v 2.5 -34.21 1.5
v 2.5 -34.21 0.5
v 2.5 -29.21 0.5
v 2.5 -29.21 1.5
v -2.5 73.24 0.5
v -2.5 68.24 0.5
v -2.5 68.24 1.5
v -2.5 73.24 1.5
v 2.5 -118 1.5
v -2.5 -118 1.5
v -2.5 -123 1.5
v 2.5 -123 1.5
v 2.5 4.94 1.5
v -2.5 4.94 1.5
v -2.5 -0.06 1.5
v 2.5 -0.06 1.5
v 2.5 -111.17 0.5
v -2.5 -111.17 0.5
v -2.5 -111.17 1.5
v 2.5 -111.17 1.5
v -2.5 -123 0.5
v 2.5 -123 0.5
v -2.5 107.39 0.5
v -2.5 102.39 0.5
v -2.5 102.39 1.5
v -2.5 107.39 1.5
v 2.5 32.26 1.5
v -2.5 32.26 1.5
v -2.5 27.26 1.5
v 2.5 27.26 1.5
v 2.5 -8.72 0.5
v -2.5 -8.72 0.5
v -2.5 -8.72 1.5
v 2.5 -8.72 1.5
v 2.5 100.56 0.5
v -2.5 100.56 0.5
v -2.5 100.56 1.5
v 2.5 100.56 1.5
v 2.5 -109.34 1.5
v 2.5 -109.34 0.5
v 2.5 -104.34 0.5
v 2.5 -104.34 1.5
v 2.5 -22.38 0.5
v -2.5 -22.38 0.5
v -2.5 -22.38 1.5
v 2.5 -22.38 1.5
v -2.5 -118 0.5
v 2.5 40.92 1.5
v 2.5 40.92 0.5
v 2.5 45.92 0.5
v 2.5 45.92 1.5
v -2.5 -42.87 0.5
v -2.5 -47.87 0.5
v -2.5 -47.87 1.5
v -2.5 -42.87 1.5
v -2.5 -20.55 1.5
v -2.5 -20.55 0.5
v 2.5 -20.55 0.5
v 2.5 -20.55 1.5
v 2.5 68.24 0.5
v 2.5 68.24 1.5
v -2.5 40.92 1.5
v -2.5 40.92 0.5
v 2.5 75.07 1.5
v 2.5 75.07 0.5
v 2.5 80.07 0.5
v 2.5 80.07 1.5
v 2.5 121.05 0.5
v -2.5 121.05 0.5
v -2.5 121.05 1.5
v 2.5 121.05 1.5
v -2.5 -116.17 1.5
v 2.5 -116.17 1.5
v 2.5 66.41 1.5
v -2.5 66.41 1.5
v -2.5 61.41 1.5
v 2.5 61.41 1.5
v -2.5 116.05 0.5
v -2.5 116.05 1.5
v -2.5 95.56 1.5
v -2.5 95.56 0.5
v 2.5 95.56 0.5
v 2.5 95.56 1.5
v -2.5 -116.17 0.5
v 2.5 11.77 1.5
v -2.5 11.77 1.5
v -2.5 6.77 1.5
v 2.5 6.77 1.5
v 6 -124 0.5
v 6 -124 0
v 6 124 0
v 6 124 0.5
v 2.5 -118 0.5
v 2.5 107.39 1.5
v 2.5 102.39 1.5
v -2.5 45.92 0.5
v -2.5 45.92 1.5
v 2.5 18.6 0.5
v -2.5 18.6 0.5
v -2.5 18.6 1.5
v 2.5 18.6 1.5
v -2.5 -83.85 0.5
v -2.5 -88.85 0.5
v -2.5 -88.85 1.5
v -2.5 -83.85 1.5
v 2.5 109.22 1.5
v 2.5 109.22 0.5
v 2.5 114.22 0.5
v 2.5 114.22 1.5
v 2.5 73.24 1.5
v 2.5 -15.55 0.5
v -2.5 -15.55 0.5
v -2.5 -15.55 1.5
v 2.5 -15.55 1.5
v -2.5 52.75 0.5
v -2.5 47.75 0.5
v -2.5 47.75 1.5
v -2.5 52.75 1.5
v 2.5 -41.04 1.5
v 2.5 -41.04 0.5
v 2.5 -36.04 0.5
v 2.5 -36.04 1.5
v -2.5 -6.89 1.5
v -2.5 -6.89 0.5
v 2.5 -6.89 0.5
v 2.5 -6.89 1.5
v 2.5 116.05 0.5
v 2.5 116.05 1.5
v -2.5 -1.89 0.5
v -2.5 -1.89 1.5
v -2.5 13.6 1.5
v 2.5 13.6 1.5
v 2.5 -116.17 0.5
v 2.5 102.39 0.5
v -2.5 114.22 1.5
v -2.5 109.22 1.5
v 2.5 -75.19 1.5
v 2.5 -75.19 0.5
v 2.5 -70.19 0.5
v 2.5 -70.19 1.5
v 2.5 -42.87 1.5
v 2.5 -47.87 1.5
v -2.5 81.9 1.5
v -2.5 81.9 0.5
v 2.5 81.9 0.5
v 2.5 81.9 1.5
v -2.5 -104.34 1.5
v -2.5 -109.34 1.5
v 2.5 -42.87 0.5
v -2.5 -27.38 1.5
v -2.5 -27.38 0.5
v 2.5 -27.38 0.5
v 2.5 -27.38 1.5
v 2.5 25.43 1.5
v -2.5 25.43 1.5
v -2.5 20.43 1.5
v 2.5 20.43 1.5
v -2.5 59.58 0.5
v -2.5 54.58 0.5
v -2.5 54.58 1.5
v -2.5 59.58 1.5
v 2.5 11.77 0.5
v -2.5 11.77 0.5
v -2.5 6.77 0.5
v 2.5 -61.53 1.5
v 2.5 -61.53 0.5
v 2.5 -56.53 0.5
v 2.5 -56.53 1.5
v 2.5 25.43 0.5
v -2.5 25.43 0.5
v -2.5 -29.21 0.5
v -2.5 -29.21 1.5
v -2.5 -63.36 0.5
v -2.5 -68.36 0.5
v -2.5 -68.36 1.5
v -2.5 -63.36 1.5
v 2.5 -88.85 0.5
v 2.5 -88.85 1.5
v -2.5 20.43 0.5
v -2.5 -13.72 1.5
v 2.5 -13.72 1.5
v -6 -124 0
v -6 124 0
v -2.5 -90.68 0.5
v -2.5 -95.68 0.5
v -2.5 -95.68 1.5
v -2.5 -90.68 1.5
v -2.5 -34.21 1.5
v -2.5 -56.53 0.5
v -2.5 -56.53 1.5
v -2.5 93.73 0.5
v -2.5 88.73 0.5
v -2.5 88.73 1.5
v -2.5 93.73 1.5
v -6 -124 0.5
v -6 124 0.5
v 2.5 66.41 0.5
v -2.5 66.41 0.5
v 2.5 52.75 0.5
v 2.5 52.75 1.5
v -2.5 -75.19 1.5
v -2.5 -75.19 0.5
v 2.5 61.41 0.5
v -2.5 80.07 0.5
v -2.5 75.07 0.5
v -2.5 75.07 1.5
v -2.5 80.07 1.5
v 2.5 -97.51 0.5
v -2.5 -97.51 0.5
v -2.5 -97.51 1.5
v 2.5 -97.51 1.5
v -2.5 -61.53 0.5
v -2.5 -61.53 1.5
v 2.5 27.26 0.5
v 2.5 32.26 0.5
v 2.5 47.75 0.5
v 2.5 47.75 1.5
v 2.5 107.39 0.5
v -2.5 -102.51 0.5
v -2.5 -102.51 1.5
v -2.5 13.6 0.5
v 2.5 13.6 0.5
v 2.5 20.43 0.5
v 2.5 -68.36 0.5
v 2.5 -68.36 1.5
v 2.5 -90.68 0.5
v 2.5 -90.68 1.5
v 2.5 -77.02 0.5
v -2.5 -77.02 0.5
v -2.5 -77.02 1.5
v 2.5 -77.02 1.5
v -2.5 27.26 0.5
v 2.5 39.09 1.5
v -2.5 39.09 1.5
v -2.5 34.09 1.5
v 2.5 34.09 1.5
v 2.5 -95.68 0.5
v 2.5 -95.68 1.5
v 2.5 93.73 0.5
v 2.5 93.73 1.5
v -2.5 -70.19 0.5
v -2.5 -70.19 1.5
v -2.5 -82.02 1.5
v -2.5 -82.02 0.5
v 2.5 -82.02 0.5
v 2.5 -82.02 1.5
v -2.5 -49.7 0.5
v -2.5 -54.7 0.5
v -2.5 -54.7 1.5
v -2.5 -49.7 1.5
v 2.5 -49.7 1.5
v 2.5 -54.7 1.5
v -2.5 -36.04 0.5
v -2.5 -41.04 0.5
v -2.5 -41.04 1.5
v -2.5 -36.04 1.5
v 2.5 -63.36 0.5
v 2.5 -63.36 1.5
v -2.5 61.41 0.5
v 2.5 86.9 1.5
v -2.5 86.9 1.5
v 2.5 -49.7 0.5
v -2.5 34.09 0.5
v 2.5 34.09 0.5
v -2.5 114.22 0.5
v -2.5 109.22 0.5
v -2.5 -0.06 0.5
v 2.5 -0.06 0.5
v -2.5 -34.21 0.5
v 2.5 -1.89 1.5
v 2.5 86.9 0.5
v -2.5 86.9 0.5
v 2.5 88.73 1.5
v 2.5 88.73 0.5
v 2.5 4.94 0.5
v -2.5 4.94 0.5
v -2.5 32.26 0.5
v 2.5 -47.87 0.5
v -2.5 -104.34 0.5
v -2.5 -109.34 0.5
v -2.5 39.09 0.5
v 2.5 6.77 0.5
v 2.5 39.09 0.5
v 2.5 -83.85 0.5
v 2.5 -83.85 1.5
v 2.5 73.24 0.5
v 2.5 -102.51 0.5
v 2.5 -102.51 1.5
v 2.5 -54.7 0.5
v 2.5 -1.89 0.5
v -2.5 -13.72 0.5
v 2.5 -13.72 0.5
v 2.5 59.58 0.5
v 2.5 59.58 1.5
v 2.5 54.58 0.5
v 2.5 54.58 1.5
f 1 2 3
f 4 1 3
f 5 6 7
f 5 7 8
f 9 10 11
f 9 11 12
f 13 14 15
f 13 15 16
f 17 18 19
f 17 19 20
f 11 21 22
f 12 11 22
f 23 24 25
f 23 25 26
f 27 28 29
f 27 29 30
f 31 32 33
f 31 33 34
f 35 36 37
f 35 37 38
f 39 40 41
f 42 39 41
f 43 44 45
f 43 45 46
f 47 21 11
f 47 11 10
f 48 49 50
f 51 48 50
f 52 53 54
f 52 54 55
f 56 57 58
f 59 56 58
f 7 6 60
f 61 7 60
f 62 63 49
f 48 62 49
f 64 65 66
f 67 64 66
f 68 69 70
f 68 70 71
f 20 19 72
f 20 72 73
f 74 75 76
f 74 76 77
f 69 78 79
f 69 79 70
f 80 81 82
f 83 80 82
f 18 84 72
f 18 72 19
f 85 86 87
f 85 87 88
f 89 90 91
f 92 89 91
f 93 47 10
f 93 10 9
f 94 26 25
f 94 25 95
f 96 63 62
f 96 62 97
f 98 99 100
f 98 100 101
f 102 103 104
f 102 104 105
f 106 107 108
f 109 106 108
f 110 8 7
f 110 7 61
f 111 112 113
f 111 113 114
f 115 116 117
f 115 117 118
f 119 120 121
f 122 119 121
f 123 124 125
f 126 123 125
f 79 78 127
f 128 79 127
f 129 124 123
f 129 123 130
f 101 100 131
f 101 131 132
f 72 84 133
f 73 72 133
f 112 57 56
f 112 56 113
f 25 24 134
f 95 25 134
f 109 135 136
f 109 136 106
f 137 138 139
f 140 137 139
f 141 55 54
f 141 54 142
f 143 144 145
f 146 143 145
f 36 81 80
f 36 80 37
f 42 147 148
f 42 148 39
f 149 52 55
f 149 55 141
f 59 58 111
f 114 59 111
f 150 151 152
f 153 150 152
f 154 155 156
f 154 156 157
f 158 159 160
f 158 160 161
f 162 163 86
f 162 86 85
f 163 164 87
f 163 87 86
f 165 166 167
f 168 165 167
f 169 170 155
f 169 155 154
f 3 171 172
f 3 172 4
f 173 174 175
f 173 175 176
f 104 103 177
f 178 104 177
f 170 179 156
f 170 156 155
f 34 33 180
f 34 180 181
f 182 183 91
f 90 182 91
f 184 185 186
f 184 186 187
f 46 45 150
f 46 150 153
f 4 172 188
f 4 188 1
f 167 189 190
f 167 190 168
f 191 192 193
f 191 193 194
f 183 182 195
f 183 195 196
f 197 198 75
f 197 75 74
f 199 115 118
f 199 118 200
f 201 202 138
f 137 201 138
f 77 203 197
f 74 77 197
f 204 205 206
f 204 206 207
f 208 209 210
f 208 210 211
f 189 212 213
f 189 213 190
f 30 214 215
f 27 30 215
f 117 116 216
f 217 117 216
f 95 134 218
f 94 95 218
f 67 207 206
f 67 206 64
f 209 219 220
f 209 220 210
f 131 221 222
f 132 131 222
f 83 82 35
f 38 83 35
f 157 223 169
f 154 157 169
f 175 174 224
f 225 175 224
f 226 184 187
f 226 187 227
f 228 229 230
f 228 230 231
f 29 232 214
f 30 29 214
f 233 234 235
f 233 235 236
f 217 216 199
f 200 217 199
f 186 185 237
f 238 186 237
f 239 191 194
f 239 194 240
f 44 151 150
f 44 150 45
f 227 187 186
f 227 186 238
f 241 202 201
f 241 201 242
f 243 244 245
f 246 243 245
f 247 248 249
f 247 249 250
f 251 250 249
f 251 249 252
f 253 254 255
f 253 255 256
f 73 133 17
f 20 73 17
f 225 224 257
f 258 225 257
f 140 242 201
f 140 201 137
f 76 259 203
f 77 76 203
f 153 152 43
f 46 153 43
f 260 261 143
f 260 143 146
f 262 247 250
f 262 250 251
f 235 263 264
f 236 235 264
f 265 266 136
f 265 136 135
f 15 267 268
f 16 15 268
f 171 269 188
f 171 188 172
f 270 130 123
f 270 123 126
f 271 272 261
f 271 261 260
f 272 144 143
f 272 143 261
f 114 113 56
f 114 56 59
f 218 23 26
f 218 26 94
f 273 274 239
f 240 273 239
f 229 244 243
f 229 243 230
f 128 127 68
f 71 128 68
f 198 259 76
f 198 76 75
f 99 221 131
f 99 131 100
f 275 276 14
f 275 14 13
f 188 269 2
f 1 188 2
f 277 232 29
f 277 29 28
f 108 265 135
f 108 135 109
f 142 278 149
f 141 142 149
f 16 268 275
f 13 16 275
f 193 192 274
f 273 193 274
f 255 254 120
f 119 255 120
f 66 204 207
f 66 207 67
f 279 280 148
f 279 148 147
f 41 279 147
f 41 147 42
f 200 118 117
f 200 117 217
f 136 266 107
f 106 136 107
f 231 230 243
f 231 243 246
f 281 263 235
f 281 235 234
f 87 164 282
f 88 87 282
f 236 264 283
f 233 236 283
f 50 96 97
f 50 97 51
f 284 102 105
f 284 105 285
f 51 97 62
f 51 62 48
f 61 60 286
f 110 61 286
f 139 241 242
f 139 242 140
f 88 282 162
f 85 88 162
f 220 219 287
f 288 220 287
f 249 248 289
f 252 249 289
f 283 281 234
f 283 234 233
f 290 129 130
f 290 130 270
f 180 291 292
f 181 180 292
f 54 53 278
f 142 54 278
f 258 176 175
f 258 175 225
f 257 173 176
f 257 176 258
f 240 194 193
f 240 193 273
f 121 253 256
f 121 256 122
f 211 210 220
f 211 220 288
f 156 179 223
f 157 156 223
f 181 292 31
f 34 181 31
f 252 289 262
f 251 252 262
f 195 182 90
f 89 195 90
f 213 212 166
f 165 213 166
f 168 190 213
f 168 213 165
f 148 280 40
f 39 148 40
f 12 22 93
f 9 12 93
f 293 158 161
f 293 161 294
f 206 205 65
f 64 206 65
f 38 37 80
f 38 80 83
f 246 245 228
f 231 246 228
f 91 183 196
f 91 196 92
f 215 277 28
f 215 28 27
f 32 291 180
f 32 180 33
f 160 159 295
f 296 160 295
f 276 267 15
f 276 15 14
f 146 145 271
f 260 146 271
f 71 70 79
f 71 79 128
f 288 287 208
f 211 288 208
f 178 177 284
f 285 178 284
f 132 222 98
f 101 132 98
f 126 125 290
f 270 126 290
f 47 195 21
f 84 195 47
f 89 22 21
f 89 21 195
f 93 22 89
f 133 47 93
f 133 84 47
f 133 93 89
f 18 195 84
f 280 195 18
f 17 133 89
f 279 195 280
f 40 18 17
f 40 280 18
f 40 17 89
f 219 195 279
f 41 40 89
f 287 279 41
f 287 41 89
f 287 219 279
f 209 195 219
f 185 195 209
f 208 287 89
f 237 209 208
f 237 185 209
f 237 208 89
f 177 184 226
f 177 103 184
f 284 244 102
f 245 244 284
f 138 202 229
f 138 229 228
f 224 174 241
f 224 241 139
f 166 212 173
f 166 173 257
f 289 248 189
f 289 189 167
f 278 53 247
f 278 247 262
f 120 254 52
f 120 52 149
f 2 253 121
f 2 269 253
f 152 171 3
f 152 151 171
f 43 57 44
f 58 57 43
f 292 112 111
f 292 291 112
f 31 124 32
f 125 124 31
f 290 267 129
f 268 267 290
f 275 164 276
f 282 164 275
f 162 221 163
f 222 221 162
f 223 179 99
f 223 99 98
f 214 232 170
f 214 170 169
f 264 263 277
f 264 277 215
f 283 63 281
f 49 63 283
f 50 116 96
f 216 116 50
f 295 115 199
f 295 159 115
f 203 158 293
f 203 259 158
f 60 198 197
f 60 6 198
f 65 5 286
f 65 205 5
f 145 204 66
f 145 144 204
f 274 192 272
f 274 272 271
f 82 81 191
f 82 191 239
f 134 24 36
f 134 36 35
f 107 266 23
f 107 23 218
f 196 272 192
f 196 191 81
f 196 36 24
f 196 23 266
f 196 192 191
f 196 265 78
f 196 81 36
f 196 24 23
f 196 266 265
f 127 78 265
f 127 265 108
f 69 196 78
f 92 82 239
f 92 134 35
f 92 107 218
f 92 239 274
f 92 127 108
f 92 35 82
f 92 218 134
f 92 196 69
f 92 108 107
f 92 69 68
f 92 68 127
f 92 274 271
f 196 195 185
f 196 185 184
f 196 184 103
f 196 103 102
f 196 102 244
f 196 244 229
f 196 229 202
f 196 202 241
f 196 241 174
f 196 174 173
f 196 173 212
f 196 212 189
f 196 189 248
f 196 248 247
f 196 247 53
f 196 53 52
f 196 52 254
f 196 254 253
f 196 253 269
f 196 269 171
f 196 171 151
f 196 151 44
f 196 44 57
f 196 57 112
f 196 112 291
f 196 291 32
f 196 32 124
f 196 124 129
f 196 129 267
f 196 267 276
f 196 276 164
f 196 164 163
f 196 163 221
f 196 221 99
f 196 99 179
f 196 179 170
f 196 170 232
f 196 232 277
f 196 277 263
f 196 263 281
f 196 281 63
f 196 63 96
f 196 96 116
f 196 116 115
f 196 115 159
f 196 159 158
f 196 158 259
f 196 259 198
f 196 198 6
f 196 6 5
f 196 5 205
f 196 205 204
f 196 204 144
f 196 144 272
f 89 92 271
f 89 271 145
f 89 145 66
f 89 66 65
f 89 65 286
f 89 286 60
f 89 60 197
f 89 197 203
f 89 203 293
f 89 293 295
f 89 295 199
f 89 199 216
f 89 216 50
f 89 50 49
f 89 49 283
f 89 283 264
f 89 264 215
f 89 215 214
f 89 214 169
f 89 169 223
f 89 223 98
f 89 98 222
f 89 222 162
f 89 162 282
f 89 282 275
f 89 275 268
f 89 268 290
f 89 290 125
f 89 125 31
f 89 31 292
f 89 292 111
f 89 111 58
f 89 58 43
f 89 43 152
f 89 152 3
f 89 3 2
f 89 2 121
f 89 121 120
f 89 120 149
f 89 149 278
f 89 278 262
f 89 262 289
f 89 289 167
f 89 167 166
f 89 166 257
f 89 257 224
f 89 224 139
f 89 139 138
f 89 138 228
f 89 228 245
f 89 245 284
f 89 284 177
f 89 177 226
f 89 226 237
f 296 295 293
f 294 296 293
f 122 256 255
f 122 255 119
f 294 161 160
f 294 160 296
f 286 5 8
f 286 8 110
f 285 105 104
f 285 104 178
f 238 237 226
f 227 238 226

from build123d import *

# Parameters (mm, degrees)
SKETCH1_W           = 12
SKETCH1_H           = 248
BOSS_EXTRUDE1_DEPTH = 0.5
SKETCH2_W           = 5
SKETCH2_H           = 5
BOSS_EXTRUDE2_DEPTH = 1


with BuildPart() as part:
    # Sketch1 → Boss-Extrude1 (new body)
    with BuildSketch(Plane.XY):
        Rectangle(SKETCH1_W, SKETCH1_H)
    extrude(amount=BOSS_EXTRUDE1_DEPTH)

    # Sketch2 → Boss-Extrude2 (add)
    with BuildSketch(Plane.XY.offset(0.5)):
        with Locations((0, -120.5)):
            Rectangle(SKETCH2_W, SKETCH2_H)
        with Locations((0, -113.67)):
            Rectangle(SKETCH2_W, SKETCH2_H)
        with Locations((0, -106.84)):
            Rectangle(SKETCH2_W, SKETCH2_H)
        with Locations((0, -100.01)):
            Rectangle(SKETCH2_W, SKETCH2_H)
        with Locations((0, -93.18)):
            Rectangle(SKETCH2_W, SKETCH2_H)
        with Locations((0, -86.35)):
            Rectangle(SKETCH2_W, SKETCH2_H)
        with Locations((0, -79.52)):
            Rectangle(SKETCH2_W, SKETCH2_H)
        with Locations((0, -72.69)):
            Rectangle(SKETCH2_W, SKETCH2_H)
        with Locations((0, -65.86)):
            Rectangle(SKETCH2_W, SKETCH2_H)
        with Locations((0, -59.03)):
            Rectangle(SKETCH2_W, SKETCH2_H)
        with Locations((0, -52.2)):
            Rectangle(SKETCH2_W, SKETCH2_H)
        with Locations((0, -45.37)):
            Rectangle(SKETCH2_W, SKETCH2_H)
        with Locations((0, -38.54)):
            Rectangle(SKETCH2_W, SKETCH2_H)
        with Locations((0, -31.71)):
            Rectangle(SKETCH2_W, SKETCH2_H)
        with Locations((0, -24.88)):
            Rectangle(SKETCH2_W, SKETCH2_H)
        with Locations((0, -18.05)):
            Rectangle(SKETCH2_W, SKETCH2_H)
        with Locations((0, -11.22)):
            Rectangle(SKETCH2_W, SKETCH2_H)
        with Locations((0, -4.39)):
            Rectangle(SKETCH2_W, SKETCH2_H)
        with Locations((0, 2.44)):
            Rectangle(SKETCH2_W, SKETCH2_H)
        with Locations((0, 9.27)):
            Rectangle(SKETCH2_W, SKETCH2_H)
        with Locations((0, 16.1)):
            Rectangle(SKETCH2_W, SKETCH2_H)
        with Locations((0, 22.93)):
            Rectangle(SKETCH2_W, SKETCH2_H)
        with Locations((0, 29.76)):
            Rectangle(SKETCH2_W, SKETCH2_H)
        with Locations((0, 36.59)):
            Rectangle(SKETCH2_W, SKETCH2_H)
        with Locations((0, 43.42)):
            Rectangle(SKETCH2_W, SKETCH2_H)
        with Locations((0, 50.25)):
            Rectangle(SKETCH2_W, SKETCH2_H)
        with Locations((0, 57.08)):
            Rectangle(SKETCH2_W, SKETCH2_H)
        with Locations((0, 63.91)):
            Rectangle(SKETCH2_W, SKETCH2_H)
        with Locations((0, 70.74)):
            Rectangle(SKETCH2_W, SKETCH2_H)
        with Locations((0, 77.57)):
            Rectangle(SKETCH2_W, SKETCH2_H)
        with Locations((0, 84.4)):
            Rectangle(SKETCH2_W, SKETCH2_H)
        with Locations((0, 91.23)):
            Rectangle(SKETCH2_W, SKETCH2_H)
        with Locations((0, 98.06)):
            Rectangle(SKETCH2_W, SKETCH2_H)
        with Locations((0, 104.89)):
            Rectangle(SKETCH2_W, SKETCH2_H)
        with Locations((0, 111.72)):
            Rectangle(SKETCH2_W, SKETCH2_H)
        with Locations((0, 118.55)):
            Rectangle(SKETCH2_W, SKETCH2_H)
    extrude(amount=BOSS_EXTRUDE2_DEPTH)


solid = part.part
